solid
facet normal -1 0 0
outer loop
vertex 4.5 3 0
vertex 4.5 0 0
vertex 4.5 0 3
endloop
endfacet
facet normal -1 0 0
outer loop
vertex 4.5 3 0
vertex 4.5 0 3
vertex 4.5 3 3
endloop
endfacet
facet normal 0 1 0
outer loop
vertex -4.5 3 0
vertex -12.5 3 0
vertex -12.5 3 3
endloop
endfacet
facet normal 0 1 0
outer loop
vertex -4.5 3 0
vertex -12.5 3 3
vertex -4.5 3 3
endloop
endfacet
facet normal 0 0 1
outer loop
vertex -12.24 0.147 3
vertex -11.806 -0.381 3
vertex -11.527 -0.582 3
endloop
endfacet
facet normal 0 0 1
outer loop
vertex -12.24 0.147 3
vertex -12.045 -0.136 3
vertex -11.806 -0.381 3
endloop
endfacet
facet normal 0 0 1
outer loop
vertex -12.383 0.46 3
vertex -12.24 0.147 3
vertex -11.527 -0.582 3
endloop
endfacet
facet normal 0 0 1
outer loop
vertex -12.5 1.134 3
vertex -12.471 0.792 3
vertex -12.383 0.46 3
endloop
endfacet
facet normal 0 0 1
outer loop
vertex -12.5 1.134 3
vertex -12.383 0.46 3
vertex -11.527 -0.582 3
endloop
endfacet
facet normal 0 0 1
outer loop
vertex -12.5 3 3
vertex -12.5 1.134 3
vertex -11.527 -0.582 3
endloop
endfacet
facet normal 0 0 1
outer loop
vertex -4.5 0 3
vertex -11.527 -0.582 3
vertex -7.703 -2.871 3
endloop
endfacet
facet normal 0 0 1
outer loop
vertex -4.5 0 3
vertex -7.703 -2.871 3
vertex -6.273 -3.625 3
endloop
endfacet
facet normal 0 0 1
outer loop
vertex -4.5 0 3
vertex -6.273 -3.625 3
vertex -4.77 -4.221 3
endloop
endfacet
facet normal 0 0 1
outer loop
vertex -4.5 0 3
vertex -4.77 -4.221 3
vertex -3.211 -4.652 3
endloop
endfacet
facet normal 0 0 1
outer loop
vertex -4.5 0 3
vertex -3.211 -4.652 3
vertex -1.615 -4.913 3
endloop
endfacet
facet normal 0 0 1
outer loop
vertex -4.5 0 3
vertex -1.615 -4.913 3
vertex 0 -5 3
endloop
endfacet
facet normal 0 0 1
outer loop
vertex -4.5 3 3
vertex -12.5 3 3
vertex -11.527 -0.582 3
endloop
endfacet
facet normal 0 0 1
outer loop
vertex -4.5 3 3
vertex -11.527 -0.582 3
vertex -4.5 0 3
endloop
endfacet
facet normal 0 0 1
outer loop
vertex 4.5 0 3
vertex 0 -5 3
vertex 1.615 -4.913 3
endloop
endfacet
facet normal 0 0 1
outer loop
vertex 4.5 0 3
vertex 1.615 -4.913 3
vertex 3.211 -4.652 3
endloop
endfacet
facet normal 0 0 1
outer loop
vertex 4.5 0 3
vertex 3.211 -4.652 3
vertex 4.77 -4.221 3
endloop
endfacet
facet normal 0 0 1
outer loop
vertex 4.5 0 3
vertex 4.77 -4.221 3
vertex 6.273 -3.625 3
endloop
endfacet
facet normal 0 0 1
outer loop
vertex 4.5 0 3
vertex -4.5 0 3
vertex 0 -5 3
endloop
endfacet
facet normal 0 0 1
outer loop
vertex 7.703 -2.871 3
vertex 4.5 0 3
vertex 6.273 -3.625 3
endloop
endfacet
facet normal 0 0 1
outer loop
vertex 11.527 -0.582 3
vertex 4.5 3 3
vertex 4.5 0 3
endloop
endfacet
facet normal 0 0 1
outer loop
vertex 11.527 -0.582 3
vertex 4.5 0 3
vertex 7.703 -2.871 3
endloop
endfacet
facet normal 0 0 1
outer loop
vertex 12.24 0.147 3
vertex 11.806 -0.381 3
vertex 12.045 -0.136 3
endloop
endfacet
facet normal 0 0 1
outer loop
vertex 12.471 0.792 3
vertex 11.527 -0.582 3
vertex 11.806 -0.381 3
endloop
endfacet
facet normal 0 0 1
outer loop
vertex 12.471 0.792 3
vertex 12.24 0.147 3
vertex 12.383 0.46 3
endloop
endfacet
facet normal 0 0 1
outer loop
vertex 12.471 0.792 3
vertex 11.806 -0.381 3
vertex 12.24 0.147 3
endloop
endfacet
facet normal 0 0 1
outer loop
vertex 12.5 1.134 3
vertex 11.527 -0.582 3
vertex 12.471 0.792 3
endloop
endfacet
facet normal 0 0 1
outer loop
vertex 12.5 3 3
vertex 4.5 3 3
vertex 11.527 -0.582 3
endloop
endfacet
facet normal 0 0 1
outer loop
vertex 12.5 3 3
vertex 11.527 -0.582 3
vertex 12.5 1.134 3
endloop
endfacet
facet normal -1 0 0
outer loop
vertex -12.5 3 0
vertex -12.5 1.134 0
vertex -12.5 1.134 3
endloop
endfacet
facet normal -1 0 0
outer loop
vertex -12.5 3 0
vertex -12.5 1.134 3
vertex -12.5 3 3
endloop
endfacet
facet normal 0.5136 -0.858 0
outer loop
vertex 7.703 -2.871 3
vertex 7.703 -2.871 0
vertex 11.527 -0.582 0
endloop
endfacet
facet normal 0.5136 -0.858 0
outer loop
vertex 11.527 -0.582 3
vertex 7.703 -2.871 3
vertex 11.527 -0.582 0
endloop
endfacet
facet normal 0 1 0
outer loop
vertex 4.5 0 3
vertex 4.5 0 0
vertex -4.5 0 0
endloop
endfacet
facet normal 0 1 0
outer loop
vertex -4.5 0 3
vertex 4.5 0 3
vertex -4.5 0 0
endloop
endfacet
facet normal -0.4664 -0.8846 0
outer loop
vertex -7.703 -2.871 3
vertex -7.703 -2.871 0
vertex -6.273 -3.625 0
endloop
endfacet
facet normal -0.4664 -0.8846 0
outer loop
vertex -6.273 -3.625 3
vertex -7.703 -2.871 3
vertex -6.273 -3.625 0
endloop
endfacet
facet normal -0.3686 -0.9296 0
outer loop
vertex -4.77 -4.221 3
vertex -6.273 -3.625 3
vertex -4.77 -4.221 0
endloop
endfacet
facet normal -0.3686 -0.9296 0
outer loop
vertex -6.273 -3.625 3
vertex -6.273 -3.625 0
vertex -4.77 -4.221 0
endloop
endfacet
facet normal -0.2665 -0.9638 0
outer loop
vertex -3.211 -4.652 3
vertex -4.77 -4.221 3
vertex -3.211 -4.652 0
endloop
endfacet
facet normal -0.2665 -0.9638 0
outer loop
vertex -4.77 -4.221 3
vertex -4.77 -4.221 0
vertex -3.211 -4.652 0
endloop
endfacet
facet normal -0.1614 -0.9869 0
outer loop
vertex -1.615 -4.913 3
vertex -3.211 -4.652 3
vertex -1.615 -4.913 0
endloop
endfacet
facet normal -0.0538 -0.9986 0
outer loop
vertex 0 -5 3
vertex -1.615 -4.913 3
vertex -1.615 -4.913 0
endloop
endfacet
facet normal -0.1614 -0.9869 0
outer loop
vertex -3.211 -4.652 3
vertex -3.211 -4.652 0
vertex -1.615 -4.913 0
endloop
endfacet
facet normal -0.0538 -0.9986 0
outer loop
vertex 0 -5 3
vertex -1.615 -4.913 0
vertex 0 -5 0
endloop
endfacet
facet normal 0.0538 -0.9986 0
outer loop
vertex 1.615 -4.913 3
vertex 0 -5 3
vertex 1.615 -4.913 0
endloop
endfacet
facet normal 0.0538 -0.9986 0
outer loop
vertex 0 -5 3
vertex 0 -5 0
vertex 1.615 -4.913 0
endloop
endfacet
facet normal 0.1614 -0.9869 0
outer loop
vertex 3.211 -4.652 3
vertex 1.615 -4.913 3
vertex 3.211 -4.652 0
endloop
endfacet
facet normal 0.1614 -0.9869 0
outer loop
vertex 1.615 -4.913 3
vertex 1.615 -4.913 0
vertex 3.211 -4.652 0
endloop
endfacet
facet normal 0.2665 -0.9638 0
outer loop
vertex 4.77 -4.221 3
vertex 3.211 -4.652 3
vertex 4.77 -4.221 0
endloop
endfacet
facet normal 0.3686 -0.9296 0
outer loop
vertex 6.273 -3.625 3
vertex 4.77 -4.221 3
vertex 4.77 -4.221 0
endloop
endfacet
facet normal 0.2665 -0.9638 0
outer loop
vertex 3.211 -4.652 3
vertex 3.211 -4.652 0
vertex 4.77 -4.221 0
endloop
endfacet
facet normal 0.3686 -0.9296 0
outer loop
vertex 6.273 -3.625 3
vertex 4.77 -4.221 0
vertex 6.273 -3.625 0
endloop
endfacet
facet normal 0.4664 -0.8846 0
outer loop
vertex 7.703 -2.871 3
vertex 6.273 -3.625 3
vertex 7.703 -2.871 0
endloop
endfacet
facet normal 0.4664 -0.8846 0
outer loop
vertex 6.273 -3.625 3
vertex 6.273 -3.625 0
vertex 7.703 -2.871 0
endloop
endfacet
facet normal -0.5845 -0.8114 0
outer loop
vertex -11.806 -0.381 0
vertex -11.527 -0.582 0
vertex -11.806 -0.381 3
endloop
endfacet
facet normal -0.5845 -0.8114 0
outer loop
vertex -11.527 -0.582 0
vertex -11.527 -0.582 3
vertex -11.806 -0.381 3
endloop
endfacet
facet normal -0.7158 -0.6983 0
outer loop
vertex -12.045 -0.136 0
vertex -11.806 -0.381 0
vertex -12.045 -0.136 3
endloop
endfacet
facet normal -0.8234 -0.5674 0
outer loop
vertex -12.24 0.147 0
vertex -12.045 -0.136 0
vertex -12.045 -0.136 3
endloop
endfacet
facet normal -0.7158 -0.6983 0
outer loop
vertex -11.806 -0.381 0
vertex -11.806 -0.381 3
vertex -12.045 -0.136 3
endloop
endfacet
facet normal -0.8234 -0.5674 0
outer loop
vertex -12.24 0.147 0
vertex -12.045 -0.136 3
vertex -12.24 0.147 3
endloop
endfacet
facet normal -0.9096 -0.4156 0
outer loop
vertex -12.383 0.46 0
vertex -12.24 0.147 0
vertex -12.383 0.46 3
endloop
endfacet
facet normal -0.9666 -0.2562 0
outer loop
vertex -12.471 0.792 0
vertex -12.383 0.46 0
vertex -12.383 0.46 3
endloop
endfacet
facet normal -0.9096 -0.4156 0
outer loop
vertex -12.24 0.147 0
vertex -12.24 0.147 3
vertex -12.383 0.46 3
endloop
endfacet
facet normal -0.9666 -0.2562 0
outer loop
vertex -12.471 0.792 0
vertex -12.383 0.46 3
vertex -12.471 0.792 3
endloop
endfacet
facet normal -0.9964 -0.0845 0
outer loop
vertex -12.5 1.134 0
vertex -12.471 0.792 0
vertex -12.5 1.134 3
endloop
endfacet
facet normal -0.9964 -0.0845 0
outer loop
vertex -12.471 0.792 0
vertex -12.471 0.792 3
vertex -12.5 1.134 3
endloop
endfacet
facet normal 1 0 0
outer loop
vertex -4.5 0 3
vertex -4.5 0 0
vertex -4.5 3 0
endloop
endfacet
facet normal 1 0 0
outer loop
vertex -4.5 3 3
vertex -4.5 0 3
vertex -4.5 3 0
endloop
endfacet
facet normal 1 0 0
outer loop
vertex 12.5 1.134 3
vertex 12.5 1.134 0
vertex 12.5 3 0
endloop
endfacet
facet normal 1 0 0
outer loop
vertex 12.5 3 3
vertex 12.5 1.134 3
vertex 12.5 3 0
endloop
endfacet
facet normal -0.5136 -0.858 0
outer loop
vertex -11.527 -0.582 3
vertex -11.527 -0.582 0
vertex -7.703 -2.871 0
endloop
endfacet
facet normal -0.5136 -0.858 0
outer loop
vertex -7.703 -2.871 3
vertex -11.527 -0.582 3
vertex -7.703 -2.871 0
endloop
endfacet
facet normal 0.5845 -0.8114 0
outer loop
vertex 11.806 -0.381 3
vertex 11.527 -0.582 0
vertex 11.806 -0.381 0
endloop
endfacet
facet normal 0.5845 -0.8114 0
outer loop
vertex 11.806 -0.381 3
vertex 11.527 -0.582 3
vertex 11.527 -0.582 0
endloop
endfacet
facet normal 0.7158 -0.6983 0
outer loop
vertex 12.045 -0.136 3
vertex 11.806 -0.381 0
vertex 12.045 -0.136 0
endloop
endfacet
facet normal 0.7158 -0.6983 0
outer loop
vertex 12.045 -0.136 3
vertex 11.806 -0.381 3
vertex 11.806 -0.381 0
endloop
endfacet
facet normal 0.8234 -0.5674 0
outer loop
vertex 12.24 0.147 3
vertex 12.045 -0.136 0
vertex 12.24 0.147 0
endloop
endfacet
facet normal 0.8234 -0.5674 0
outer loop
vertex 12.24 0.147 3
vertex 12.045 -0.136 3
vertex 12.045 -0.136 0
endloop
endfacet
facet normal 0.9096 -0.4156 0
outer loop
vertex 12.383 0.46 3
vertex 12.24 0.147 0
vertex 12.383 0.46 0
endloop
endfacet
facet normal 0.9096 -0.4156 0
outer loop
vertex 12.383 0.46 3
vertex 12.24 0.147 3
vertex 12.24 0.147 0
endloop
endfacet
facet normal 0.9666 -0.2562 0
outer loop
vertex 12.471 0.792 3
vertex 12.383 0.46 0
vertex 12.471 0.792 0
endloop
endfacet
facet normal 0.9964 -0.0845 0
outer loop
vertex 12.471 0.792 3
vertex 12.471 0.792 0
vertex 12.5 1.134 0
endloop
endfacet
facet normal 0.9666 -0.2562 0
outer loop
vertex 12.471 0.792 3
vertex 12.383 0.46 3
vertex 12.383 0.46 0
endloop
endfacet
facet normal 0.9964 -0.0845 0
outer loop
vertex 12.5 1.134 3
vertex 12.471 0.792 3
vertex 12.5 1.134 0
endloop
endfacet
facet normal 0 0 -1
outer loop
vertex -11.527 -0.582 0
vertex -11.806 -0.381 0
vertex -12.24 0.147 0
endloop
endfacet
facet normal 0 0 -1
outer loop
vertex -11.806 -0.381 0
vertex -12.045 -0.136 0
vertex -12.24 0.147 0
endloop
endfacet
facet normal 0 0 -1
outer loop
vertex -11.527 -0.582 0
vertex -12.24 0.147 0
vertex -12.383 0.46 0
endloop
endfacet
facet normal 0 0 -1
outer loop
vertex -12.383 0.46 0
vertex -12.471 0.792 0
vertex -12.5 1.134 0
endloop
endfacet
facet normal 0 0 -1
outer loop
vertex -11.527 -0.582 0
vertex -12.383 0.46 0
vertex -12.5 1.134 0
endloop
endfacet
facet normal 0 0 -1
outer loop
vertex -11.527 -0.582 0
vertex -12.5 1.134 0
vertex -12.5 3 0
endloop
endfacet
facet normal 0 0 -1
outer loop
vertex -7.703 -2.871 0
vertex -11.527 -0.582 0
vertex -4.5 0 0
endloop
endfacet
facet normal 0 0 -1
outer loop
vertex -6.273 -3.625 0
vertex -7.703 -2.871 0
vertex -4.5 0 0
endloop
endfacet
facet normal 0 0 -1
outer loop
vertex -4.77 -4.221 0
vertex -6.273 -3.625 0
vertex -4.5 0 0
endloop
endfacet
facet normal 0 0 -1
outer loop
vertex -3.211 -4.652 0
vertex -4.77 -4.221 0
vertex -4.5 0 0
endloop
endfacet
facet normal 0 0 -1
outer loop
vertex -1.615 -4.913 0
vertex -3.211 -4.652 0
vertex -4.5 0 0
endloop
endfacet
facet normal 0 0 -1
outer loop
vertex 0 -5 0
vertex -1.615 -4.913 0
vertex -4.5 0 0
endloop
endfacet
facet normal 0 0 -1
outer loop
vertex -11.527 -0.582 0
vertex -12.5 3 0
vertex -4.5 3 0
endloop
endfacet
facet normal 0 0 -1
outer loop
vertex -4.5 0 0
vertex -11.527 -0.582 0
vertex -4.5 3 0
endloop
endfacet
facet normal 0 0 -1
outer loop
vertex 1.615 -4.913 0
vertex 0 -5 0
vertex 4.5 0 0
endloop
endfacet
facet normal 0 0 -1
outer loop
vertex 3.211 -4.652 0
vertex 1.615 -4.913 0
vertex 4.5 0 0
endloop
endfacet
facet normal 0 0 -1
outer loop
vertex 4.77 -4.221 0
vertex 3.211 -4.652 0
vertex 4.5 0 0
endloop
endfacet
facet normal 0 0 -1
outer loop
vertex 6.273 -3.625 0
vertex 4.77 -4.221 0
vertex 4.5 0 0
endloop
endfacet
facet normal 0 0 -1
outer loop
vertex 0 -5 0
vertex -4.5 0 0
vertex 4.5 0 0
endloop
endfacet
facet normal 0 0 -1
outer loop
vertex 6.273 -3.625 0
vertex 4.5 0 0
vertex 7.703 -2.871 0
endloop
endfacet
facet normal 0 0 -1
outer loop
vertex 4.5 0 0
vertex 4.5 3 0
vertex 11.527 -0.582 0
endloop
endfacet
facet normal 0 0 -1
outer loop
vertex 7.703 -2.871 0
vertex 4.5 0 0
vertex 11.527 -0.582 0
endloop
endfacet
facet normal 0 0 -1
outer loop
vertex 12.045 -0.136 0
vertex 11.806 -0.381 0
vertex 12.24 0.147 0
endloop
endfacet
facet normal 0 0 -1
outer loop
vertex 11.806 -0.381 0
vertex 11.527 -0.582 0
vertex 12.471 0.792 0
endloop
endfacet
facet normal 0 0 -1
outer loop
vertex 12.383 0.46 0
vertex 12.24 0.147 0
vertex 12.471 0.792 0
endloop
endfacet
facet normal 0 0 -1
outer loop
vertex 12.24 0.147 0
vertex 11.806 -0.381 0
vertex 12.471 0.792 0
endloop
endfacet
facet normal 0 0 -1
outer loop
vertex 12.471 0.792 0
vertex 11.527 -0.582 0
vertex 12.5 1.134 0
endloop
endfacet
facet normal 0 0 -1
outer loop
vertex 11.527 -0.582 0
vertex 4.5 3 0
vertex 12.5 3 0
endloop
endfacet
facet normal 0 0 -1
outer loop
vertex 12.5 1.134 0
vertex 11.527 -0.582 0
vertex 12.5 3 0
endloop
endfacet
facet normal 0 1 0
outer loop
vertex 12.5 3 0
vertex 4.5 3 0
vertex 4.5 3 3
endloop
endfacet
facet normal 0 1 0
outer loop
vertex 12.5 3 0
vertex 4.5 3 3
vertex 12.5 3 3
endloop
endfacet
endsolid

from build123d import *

# Parameters (mm, degrees)
CROQUIS1_W              = 8
CROQUIS1_H              = 3
SALIENTE_EXTRUIR1_DEPTH = 3
REDONDEO1_R             = 2


with BuildPart() as part:
    # Croquis1 → Saliente-Extruir1 (new body)
    with BuildSketch(Plane.XY):
        with BuildLine():
            Line((-12.5, 0), (-7.703315155, -2.870856056))
            ThreePointArc((-7.703315155, -2.870856056), (0, -5), (7.703315155, -2.870856056))
            Line((7.703315155, -2.870856056), (12.5, 0))
            Line((12.5, 0), (-12.5, 0))
        make_face()
        with Locations((-8.5, 1.5)):
            Rectangle(CROQUIS1_W, CROQUIS1_H)
        with Locations((8.5, 1.5)):
            Rectangle(CROQUIS1_W, CROQUIS1_H)
    extrude(amount=SALIENTE_EXTRUIR1_DEPTH)

    # Redondeo1
    redondeo1_edges = [part.edges().sort_by_distance(p)[0] for p in [
        (-12.5, 0, 1.5),
        (12.5, 0, 1.5),
    ]]
    fillet(redondeo1_edges, radius=REDONDEO1_R)


solid = part.part
